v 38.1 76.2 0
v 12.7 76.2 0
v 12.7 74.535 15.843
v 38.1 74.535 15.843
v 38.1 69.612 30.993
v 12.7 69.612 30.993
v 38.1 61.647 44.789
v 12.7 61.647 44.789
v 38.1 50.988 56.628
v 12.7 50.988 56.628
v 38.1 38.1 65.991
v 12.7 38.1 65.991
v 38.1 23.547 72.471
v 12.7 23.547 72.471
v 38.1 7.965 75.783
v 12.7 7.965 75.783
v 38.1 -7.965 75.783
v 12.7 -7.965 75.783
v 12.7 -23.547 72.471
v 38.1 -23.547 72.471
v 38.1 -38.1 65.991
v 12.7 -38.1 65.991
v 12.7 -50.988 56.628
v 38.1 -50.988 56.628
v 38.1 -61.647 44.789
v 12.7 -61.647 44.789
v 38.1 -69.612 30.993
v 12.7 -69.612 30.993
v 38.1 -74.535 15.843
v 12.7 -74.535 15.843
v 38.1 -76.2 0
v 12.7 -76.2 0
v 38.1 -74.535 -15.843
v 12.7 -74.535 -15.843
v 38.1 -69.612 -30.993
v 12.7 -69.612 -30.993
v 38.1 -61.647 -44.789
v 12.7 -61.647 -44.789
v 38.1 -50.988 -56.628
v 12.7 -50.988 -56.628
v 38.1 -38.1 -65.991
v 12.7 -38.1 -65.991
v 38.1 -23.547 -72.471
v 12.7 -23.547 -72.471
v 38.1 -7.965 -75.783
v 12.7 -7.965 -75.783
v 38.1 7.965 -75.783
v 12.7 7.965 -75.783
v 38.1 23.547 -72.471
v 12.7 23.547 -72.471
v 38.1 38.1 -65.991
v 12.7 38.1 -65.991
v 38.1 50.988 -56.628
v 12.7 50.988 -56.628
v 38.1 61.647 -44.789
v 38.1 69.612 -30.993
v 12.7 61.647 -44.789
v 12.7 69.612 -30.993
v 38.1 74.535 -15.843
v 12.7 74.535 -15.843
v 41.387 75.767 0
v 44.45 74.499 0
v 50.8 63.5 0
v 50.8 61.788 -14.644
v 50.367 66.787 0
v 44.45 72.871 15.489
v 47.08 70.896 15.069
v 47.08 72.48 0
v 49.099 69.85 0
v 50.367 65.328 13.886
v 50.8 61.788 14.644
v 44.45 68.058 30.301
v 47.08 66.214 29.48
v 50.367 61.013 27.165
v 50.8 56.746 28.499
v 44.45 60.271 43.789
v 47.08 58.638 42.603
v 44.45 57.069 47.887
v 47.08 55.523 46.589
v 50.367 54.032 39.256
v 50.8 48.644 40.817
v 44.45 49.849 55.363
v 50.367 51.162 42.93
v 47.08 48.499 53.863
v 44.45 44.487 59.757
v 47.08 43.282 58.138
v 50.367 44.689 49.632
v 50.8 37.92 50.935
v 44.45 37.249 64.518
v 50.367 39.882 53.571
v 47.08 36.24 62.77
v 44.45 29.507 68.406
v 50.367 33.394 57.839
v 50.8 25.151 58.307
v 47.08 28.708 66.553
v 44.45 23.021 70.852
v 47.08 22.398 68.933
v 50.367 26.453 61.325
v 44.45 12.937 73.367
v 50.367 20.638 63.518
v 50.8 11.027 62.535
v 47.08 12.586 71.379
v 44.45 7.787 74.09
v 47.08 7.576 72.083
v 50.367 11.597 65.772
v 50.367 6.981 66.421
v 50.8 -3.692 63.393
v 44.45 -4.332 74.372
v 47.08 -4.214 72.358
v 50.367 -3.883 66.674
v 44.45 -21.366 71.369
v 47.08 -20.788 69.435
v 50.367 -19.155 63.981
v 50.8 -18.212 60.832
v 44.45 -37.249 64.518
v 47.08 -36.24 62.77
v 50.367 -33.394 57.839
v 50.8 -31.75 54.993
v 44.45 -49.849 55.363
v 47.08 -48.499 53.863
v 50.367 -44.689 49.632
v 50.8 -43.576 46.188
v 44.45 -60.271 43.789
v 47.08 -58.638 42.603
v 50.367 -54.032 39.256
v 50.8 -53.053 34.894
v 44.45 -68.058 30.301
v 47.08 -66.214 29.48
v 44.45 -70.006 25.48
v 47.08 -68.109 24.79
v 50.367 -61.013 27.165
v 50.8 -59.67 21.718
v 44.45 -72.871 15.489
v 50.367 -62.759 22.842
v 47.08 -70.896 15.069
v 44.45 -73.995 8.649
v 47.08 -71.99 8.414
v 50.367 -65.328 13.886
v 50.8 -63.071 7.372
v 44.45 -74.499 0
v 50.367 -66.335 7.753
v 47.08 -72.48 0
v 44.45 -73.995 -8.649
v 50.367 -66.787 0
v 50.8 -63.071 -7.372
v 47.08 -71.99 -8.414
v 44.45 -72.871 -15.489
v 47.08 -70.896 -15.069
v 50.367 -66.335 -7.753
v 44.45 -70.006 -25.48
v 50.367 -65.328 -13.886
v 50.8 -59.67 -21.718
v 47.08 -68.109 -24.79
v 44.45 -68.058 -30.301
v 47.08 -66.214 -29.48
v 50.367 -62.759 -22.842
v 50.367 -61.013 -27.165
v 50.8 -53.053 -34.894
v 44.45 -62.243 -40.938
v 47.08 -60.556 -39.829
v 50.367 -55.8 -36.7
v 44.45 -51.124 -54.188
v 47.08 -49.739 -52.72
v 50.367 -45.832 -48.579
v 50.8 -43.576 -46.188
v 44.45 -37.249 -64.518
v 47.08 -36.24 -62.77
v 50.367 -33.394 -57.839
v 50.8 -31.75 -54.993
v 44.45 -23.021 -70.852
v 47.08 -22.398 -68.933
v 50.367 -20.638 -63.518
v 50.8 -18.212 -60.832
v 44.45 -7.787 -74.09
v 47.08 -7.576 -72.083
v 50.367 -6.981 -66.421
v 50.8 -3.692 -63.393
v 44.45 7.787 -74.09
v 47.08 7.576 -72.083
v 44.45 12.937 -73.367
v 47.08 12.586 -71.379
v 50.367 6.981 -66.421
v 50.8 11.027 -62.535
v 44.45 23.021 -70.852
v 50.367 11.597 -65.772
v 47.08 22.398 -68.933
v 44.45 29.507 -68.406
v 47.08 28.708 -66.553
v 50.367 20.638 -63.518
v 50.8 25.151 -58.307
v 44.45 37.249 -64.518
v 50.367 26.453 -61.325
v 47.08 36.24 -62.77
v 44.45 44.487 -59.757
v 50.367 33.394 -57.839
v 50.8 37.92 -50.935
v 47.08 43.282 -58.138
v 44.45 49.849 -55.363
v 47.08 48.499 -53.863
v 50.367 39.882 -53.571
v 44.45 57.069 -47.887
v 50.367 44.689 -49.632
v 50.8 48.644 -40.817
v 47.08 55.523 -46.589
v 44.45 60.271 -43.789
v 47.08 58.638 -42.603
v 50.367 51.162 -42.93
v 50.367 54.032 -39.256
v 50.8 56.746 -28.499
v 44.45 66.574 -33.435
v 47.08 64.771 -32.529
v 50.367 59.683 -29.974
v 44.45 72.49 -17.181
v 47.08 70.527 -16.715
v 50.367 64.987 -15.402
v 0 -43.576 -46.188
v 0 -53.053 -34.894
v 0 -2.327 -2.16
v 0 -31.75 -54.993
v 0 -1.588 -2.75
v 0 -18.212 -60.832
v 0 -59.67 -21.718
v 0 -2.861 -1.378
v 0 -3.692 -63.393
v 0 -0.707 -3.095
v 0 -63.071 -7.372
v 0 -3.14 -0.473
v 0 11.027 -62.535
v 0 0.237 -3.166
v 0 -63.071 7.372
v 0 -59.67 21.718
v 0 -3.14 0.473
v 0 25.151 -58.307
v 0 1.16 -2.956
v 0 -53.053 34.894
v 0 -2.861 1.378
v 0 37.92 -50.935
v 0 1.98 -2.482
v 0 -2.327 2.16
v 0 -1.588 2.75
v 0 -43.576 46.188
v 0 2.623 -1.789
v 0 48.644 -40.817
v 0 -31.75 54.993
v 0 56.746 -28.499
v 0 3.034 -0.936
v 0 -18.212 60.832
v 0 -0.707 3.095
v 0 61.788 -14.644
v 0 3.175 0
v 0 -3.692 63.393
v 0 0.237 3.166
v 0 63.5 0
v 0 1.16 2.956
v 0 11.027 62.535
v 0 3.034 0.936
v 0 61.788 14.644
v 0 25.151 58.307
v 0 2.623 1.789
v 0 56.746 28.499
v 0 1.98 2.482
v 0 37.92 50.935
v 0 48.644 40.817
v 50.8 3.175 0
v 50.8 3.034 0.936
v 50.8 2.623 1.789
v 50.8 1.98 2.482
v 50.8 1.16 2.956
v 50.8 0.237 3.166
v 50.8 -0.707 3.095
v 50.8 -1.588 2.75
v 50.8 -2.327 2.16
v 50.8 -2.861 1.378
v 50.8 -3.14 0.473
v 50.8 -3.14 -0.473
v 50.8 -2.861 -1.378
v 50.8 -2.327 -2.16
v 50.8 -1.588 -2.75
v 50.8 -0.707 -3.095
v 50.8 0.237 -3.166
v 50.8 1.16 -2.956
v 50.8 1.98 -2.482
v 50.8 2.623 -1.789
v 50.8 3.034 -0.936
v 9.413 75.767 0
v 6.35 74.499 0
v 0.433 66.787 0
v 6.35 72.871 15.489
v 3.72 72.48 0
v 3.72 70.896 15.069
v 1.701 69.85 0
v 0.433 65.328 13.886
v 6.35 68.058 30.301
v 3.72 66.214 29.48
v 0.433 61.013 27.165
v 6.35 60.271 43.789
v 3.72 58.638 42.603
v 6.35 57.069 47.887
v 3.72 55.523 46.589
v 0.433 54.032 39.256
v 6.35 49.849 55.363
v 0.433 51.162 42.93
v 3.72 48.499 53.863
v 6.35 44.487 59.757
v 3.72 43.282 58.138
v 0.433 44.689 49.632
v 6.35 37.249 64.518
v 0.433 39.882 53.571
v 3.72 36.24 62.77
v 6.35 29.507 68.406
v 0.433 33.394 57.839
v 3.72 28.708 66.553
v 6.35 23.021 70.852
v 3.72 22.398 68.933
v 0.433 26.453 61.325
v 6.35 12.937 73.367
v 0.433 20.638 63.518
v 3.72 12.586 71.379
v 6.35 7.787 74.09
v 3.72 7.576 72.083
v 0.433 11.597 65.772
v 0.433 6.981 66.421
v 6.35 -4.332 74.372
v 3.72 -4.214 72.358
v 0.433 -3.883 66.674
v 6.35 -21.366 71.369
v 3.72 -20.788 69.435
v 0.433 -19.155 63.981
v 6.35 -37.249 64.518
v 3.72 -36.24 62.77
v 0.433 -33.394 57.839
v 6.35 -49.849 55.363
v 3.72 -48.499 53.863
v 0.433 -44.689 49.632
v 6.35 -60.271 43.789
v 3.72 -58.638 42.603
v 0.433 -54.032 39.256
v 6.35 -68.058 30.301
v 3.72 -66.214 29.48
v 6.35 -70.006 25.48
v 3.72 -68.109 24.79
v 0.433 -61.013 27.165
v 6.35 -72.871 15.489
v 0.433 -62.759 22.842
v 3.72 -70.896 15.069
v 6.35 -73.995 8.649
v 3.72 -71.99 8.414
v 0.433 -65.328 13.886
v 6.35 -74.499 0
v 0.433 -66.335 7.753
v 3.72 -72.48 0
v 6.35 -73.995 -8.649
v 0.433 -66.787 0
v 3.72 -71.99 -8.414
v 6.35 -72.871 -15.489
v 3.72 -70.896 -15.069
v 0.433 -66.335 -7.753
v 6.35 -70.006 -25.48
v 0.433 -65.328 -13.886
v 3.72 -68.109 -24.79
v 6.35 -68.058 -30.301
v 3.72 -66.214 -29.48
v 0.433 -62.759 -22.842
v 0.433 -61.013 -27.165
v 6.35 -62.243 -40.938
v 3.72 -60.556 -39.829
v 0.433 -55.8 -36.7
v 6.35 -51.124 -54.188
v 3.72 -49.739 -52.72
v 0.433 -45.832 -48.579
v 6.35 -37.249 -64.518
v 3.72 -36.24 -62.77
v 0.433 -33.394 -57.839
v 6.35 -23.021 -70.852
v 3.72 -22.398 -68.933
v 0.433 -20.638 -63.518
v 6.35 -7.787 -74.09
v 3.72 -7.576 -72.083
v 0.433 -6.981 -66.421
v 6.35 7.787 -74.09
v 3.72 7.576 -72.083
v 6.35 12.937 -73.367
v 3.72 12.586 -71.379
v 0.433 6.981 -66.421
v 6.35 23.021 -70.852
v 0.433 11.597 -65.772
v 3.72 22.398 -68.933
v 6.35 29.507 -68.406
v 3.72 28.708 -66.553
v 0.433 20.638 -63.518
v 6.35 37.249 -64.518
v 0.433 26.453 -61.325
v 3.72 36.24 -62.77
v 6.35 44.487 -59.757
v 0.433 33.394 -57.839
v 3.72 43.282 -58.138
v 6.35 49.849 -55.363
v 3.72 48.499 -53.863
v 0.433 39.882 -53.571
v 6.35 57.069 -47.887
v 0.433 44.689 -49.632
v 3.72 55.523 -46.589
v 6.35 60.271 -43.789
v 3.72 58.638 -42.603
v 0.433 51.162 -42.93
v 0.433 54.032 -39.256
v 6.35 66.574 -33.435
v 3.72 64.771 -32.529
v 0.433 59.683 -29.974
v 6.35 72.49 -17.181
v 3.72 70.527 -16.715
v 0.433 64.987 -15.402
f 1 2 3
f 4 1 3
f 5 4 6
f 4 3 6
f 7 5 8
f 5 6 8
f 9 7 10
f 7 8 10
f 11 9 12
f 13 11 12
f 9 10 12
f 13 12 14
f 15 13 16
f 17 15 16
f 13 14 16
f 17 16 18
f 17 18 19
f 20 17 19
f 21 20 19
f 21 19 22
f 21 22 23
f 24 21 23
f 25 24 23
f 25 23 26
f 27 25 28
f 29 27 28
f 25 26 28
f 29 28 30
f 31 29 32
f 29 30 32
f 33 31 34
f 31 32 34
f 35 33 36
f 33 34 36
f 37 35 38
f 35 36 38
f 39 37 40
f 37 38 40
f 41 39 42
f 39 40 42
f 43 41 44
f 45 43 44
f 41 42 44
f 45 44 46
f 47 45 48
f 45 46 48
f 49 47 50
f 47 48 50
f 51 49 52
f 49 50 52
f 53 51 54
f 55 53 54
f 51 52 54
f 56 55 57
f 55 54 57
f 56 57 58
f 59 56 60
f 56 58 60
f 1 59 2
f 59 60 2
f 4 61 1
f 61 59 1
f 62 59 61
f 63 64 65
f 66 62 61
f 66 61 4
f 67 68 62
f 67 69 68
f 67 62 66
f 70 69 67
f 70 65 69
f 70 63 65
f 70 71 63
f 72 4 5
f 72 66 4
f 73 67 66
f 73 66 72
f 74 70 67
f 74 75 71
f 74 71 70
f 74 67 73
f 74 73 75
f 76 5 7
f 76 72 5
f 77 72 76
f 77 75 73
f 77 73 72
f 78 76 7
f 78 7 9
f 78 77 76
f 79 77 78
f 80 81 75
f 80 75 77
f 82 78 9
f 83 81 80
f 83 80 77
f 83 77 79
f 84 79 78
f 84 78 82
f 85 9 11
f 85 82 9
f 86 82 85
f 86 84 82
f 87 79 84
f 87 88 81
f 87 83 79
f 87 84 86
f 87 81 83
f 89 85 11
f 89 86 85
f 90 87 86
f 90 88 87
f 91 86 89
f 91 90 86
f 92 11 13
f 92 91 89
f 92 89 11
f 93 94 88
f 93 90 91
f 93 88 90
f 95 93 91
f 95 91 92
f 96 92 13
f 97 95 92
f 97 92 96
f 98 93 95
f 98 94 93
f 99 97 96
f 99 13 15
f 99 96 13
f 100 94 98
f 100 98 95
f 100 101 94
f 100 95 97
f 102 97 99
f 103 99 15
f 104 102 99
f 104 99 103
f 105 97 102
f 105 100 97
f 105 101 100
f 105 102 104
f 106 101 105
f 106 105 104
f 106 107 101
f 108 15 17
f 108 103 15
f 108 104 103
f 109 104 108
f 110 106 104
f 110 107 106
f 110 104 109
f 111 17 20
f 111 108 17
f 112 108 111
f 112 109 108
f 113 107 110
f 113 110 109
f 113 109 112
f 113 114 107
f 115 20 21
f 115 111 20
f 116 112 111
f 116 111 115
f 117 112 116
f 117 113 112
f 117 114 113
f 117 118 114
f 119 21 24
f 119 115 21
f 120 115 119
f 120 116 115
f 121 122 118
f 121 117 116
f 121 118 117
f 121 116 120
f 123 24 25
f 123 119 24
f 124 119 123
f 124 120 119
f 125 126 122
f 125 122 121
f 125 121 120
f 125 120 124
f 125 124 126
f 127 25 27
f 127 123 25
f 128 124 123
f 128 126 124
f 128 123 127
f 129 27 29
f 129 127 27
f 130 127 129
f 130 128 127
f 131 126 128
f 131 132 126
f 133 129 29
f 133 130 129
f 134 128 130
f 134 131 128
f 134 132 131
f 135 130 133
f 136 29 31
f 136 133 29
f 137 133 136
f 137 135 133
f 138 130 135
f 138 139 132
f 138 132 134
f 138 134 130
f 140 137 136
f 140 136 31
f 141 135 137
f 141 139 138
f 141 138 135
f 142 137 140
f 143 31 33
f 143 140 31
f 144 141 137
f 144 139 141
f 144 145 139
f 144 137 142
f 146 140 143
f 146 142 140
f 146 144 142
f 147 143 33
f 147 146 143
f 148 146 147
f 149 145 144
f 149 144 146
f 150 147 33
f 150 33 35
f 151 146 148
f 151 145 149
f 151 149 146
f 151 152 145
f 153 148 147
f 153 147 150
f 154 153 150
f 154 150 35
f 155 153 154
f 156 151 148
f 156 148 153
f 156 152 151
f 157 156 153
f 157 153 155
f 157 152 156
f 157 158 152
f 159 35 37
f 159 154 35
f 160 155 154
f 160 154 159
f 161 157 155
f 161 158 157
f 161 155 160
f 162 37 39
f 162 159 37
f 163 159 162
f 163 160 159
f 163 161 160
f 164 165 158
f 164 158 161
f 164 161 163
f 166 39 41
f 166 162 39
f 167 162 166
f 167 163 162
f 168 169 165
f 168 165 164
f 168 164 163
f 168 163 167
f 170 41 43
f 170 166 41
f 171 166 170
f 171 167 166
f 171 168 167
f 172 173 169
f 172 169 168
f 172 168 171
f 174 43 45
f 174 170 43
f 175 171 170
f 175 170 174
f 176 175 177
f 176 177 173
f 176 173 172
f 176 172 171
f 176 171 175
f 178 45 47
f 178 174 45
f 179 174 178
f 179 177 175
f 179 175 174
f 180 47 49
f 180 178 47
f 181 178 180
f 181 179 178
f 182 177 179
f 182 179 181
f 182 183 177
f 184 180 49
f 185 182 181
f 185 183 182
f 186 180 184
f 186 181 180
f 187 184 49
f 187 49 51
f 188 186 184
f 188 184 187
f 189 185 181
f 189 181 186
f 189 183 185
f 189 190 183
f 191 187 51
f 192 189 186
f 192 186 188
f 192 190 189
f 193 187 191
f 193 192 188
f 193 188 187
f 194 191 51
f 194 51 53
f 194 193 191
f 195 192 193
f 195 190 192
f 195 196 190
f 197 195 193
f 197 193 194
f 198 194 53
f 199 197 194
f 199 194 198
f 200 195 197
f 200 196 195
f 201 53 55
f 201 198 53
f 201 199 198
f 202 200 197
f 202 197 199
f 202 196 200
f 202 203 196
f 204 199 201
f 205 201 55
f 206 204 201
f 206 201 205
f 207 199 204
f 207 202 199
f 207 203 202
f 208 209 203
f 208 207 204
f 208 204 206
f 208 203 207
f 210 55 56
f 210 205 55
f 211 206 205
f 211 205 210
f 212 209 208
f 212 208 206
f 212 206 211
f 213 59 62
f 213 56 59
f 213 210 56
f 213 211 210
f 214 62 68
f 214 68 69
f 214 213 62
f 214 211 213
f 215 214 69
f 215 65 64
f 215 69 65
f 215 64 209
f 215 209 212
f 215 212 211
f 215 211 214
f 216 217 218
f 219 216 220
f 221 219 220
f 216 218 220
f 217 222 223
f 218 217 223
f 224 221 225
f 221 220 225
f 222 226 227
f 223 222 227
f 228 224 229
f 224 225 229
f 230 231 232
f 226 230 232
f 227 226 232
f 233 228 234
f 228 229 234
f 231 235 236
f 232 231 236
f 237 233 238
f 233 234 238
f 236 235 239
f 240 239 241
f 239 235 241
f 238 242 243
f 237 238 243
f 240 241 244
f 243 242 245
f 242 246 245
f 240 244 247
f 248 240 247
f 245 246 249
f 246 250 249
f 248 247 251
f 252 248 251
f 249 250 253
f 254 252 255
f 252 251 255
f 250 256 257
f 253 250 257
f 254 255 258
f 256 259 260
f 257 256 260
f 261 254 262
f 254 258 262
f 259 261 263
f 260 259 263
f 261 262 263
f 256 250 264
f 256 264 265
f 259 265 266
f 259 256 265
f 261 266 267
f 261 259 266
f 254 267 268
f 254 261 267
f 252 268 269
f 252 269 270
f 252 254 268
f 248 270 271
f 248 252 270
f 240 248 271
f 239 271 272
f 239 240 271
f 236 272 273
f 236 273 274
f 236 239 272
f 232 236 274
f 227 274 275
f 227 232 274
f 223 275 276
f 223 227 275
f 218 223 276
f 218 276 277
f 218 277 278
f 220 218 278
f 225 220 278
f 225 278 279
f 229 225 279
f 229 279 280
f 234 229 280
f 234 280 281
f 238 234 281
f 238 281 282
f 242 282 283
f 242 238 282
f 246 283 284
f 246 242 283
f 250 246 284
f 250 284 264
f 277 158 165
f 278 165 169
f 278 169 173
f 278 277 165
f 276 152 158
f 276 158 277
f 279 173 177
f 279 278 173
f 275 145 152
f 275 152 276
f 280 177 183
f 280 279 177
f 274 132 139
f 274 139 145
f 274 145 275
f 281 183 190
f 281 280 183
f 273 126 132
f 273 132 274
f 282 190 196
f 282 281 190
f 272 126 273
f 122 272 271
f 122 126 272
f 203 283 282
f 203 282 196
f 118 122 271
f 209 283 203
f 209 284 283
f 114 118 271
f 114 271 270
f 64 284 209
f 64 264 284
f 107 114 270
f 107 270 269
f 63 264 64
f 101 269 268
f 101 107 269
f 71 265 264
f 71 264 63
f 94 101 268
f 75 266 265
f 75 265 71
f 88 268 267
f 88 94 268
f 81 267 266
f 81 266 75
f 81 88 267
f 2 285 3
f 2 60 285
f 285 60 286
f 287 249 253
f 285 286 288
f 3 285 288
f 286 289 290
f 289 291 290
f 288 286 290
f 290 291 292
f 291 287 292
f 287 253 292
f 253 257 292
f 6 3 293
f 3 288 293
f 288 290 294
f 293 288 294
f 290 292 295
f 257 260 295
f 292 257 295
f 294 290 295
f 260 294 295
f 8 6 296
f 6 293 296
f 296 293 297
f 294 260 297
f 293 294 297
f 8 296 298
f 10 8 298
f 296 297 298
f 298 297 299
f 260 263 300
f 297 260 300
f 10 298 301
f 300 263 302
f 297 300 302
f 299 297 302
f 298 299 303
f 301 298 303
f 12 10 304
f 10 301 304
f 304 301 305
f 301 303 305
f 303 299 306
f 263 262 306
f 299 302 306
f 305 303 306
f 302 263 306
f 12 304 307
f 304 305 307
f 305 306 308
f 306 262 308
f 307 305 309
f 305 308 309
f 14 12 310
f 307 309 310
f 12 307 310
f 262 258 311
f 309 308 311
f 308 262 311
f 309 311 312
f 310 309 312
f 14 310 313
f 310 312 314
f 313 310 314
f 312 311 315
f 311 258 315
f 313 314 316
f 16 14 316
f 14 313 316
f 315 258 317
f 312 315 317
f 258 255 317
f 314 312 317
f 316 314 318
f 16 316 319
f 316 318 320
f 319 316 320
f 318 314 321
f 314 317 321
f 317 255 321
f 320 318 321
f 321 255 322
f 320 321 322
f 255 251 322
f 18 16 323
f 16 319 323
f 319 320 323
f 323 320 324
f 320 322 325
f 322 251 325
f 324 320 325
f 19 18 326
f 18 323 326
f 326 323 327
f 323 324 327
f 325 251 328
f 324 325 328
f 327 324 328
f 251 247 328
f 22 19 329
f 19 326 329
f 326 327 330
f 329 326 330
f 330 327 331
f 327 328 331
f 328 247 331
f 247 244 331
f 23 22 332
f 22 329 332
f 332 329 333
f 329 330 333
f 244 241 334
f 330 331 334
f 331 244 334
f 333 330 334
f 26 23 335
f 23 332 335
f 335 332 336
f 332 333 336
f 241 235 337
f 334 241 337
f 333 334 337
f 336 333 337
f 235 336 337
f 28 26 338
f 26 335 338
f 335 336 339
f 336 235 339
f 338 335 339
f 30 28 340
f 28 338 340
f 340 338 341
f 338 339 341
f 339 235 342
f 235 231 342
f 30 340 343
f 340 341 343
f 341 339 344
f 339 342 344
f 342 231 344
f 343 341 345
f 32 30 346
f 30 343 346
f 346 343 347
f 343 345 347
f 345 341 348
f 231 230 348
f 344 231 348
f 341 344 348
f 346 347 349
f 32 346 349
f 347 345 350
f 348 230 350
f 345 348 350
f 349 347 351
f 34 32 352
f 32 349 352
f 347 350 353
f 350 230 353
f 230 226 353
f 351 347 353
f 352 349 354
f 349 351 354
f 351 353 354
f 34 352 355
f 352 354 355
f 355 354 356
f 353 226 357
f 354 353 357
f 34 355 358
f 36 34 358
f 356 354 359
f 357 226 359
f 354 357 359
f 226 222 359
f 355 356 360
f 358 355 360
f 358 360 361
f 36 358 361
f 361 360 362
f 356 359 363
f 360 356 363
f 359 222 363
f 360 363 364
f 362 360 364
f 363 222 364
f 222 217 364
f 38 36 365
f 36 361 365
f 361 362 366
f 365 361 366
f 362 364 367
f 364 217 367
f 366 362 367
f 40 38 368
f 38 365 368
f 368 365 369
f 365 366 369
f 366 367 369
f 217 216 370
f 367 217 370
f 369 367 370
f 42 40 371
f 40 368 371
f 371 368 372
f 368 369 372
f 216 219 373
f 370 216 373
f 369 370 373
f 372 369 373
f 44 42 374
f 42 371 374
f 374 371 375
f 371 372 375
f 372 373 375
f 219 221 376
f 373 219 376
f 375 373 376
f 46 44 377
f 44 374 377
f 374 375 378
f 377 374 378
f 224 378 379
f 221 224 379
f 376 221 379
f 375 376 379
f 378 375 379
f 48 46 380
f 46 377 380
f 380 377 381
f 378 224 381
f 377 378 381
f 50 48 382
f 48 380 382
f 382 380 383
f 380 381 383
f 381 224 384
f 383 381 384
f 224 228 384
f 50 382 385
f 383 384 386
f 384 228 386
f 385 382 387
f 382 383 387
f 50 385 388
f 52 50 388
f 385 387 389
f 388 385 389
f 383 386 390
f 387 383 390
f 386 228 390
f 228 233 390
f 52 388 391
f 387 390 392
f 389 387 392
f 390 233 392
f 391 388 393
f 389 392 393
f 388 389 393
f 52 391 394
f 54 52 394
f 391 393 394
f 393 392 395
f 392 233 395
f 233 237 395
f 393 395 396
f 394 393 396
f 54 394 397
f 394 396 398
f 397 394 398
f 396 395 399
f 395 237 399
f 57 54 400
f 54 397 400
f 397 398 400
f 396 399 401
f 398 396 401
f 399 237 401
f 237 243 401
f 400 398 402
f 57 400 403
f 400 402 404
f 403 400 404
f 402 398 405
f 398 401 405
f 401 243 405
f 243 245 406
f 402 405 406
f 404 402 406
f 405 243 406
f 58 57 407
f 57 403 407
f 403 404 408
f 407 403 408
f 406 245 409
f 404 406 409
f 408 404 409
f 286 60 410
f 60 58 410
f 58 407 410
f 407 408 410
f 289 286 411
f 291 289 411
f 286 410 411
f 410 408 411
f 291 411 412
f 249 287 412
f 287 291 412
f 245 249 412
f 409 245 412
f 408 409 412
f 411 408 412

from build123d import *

# Parameters (mm, degrees)
F0_R     = 76.2
F0_R_2   = 3.175
F1_DEPTH = 50.8
F2_R     = 12.7
F3_R     = 12.7


with BuildPart() as f1:
    # F0 (on Right) → F1 (new body)
    with BuildSketch(Plane.YZ):
        Circle(F0_R)
        Circle(F0_R_2, mode=Mode.SUBTRACT)
    extrude(amount=F1_DEPTH)

    # F2
    f2_edges = [f1.edges().sort_by_distance(p)[0] for p in [
        (50.8, -76.2, 0),
    ]]
    fillet(f2_edges, radius=F2_R)

    # F3
    f3_edges = [f1.edges().sort_by_distance(p)[0] for p in [
        (0, -76.2, 0),
    ]]
    fillet(f3_edges, radius=F3_R)


solid = f1.part
